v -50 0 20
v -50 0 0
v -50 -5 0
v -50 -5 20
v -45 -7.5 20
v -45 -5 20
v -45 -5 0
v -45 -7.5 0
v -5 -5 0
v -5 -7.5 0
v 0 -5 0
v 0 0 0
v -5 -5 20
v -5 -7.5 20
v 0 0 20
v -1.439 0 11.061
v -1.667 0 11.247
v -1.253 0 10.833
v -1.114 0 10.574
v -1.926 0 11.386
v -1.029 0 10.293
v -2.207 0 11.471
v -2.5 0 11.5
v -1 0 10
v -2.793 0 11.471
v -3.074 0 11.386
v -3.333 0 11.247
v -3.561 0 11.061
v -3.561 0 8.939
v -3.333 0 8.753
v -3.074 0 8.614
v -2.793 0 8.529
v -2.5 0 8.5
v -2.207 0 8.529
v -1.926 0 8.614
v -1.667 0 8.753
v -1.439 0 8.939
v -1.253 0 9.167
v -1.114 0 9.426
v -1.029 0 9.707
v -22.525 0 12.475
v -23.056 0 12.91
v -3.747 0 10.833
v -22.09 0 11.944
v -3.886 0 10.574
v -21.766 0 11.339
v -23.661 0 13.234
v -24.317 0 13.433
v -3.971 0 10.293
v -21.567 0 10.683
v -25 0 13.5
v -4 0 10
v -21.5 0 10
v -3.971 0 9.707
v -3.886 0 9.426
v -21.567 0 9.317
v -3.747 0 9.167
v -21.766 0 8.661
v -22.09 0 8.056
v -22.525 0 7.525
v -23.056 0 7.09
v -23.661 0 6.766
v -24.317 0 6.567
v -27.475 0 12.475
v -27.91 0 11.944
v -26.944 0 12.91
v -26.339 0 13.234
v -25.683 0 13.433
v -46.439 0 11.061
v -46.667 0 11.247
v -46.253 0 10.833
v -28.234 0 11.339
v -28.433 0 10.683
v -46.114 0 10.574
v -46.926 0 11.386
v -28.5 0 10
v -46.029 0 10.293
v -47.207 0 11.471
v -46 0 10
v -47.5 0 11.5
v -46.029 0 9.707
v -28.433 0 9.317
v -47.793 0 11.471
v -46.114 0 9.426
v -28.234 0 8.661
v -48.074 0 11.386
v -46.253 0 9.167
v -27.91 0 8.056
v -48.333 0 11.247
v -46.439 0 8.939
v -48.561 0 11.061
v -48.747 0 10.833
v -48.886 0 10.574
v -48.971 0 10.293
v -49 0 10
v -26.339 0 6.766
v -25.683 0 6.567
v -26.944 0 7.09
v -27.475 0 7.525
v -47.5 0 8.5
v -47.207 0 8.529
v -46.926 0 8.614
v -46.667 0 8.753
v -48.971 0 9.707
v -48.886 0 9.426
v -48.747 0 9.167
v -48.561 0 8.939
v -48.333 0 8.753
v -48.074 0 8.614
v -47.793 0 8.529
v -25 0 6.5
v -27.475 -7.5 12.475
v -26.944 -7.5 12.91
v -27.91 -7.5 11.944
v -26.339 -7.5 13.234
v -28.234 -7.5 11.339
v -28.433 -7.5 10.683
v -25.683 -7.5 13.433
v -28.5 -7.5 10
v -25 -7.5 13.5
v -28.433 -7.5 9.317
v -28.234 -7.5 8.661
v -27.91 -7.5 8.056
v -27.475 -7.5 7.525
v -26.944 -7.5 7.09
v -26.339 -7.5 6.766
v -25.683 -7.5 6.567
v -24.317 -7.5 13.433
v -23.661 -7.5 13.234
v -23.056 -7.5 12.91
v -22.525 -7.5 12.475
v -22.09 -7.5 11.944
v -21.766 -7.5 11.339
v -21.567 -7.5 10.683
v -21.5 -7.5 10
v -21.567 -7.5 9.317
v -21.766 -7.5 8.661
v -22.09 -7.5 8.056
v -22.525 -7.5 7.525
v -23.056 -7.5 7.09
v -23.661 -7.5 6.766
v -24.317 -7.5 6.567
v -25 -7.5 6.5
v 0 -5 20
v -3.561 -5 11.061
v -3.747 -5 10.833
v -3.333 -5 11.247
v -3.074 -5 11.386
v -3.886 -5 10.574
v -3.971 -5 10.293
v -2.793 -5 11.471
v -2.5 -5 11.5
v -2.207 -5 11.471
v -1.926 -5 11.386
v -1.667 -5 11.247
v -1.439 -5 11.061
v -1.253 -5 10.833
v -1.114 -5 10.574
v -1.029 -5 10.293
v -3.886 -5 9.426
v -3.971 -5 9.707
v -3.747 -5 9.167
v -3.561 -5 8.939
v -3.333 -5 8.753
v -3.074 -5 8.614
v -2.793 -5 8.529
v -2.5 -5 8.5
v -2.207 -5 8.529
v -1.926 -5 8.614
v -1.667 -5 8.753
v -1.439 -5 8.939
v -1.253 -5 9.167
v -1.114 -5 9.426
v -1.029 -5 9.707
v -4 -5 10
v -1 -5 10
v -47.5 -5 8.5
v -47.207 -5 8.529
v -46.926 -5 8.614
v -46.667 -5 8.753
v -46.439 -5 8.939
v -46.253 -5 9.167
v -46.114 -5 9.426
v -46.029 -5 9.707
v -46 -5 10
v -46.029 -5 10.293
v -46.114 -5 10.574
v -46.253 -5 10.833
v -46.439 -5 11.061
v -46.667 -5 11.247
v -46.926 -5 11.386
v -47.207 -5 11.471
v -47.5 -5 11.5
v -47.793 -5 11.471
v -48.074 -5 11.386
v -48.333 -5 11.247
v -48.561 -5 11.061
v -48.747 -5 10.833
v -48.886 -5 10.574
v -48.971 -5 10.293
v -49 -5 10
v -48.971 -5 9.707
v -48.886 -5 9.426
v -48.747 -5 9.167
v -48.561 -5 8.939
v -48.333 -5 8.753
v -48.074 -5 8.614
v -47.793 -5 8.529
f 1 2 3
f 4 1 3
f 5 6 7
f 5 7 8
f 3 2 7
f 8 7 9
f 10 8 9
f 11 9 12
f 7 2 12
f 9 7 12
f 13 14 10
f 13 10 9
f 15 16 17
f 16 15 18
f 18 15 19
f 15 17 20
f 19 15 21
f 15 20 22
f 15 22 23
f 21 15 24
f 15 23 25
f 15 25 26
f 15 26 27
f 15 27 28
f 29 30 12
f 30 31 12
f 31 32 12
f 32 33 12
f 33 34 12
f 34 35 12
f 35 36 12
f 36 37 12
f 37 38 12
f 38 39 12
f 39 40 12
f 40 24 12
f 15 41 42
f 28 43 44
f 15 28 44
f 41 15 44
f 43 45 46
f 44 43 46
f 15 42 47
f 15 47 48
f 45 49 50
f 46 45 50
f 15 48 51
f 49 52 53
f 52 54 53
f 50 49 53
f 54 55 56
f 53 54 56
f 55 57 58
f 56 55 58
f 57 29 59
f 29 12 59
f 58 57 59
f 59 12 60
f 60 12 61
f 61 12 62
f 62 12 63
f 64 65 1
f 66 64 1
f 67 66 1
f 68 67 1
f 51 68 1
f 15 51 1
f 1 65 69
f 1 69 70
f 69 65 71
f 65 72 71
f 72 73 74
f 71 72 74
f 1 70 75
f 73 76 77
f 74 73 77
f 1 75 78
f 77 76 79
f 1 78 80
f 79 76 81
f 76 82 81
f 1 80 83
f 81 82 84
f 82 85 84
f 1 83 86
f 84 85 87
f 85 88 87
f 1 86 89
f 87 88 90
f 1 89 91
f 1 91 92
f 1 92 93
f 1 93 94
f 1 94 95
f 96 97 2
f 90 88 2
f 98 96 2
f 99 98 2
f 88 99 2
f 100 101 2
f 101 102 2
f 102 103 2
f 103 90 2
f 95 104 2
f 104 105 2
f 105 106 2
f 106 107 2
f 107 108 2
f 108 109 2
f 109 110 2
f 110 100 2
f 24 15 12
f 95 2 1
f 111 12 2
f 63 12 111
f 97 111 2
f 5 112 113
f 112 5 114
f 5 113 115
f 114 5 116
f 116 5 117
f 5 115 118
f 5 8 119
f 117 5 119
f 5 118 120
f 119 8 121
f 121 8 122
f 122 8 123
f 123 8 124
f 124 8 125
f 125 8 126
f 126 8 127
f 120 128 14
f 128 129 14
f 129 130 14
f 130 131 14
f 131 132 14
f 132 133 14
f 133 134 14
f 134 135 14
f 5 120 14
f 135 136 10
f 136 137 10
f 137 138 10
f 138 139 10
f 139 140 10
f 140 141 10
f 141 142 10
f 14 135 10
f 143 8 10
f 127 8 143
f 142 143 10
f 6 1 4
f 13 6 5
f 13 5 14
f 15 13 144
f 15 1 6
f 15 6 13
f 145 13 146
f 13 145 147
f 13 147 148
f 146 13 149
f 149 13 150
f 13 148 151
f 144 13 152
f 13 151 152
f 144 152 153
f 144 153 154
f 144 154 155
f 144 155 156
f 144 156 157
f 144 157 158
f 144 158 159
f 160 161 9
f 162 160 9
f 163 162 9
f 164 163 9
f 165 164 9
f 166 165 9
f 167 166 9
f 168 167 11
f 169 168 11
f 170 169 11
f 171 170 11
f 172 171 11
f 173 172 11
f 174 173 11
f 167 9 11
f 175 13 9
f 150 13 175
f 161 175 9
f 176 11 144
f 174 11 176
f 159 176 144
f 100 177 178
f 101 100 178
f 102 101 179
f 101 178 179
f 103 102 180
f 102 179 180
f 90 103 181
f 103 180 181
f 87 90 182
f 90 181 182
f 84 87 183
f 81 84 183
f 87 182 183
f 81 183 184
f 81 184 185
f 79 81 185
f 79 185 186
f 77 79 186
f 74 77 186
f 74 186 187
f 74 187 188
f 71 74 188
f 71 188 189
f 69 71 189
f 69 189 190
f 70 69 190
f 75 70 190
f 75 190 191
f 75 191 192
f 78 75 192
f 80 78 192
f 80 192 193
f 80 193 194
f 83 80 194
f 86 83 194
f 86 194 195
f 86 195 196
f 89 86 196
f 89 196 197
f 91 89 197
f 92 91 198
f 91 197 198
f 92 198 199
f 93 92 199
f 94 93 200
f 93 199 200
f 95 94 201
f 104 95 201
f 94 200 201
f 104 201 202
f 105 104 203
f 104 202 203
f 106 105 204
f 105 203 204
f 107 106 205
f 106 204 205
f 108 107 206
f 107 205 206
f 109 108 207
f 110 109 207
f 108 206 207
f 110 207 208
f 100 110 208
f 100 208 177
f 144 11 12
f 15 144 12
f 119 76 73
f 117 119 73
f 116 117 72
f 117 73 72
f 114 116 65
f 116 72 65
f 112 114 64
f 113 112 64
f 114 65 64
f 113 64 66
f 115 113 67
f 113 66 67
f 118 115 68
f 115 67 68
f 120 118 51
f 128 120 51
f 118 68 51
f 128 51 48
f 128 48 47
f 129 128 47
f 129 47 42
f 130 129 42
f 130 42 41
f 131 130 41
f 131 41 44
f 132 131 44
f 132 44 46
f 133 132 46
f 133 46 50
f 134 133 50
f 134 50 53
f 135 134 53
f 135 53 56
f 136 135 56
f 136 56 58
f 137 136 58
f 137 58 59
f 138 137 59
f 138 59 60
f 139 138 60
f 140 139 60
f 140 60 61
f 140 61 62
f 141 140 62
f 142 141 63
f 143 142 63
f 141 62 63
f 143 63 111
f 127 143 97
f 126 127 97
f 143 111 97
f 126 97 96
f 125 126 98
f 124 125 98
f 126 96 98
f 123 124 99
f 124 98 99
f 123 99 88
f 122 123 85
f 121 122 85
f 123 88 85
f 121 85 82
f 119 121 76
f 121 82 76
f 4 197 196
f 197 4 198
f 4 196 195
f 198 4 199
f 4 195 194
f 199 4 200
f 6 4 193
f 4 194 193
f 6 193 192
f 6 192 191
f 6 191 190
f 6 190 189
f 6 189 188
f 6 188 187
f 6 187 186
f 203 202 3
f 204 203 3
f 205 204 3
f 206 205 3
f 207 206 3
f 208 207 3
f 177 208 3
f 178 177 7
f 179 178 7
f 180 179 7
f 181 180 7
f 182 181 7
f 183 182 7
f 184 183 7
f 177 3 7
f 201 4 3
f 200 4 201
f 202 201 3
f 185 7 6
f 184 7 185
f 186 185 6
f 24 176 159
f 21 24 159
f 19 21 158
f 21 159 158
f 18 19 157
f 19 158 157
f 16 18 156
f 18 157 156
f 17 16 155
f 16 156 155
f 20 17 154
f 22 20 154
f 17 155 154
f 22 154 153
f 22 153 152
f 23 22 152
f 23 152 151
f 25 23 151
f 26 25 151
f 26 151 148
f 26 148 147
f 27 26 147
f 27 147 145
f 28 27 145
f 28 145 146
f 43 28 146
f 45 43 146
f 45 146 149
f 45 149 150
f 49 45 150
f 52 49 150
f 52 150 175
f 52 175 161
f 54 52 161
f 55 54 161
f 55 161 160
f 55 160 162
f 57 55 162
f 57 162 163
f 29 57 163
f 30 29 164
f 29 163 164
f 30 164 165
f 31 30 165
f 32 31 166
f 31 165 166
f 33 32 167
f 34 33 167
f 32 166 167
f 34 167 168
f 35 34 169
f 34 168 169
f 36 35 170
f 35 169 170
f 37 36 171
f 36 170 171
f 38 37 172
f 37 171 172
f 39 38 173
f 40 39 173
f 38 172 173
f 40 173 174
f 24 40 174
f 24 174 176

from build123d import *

# Parameters (mm, degrees)
EXTRUSION1_DEPTH        = 20
ESQUISSE2_R             = 3.5
ENL_V_MAT_EXTRU_1_DEPTH = 20
ESQUISSE3_R             = 1.5
ENL_V_MAT_EXTRU_2_DEPTH = 10


with BuildPart() as part:
    # Esquisse1 → Extrusion1 (new body)
    with BuildSketch(Plane.XY):
        Polygon((0, 0), (-50, 0), (-50, -5), (-45, -5), (-45, -7.5), (-5, -7.5), (-5, -5), (0, -5), align=None)
    extrude(amount=EXTRUSION1_DEPTH)

    # Esquisse2 → Enlèv. mat.-Extru.1 (cut)
    with BuildSketch(Plane(origin=(0, 0, 0), x_dir=(1, 0, 0), z_dir=(0, 1, 0))):
        with Locations(Location((-25, -10, 0), (0, 0, 180))):
            Circle(ESQUISSE2_R)
    extrude(amount=-ENL_V_MAT_EXTRU_1_DEPTH, mode=Mode.SUBTRACT)

    # Esquisse3 → Enlèv. mat.-Extru.2 (cut)
    with BuildSketch(Plane.XZ.offset(5)):
        with Locations(Location((-47.5, 10, 0), (0, 0, 270))):
            Circle(ESQUISSE3_R)
        with Locations((-2.5, 10)):
            Circle(ESQUISSE3_R)
    extrude(amount=-ENL_V_MAT_EXTRU_2_DEPTH, mode=Mode.SUBTRACT)


solid = part.part
